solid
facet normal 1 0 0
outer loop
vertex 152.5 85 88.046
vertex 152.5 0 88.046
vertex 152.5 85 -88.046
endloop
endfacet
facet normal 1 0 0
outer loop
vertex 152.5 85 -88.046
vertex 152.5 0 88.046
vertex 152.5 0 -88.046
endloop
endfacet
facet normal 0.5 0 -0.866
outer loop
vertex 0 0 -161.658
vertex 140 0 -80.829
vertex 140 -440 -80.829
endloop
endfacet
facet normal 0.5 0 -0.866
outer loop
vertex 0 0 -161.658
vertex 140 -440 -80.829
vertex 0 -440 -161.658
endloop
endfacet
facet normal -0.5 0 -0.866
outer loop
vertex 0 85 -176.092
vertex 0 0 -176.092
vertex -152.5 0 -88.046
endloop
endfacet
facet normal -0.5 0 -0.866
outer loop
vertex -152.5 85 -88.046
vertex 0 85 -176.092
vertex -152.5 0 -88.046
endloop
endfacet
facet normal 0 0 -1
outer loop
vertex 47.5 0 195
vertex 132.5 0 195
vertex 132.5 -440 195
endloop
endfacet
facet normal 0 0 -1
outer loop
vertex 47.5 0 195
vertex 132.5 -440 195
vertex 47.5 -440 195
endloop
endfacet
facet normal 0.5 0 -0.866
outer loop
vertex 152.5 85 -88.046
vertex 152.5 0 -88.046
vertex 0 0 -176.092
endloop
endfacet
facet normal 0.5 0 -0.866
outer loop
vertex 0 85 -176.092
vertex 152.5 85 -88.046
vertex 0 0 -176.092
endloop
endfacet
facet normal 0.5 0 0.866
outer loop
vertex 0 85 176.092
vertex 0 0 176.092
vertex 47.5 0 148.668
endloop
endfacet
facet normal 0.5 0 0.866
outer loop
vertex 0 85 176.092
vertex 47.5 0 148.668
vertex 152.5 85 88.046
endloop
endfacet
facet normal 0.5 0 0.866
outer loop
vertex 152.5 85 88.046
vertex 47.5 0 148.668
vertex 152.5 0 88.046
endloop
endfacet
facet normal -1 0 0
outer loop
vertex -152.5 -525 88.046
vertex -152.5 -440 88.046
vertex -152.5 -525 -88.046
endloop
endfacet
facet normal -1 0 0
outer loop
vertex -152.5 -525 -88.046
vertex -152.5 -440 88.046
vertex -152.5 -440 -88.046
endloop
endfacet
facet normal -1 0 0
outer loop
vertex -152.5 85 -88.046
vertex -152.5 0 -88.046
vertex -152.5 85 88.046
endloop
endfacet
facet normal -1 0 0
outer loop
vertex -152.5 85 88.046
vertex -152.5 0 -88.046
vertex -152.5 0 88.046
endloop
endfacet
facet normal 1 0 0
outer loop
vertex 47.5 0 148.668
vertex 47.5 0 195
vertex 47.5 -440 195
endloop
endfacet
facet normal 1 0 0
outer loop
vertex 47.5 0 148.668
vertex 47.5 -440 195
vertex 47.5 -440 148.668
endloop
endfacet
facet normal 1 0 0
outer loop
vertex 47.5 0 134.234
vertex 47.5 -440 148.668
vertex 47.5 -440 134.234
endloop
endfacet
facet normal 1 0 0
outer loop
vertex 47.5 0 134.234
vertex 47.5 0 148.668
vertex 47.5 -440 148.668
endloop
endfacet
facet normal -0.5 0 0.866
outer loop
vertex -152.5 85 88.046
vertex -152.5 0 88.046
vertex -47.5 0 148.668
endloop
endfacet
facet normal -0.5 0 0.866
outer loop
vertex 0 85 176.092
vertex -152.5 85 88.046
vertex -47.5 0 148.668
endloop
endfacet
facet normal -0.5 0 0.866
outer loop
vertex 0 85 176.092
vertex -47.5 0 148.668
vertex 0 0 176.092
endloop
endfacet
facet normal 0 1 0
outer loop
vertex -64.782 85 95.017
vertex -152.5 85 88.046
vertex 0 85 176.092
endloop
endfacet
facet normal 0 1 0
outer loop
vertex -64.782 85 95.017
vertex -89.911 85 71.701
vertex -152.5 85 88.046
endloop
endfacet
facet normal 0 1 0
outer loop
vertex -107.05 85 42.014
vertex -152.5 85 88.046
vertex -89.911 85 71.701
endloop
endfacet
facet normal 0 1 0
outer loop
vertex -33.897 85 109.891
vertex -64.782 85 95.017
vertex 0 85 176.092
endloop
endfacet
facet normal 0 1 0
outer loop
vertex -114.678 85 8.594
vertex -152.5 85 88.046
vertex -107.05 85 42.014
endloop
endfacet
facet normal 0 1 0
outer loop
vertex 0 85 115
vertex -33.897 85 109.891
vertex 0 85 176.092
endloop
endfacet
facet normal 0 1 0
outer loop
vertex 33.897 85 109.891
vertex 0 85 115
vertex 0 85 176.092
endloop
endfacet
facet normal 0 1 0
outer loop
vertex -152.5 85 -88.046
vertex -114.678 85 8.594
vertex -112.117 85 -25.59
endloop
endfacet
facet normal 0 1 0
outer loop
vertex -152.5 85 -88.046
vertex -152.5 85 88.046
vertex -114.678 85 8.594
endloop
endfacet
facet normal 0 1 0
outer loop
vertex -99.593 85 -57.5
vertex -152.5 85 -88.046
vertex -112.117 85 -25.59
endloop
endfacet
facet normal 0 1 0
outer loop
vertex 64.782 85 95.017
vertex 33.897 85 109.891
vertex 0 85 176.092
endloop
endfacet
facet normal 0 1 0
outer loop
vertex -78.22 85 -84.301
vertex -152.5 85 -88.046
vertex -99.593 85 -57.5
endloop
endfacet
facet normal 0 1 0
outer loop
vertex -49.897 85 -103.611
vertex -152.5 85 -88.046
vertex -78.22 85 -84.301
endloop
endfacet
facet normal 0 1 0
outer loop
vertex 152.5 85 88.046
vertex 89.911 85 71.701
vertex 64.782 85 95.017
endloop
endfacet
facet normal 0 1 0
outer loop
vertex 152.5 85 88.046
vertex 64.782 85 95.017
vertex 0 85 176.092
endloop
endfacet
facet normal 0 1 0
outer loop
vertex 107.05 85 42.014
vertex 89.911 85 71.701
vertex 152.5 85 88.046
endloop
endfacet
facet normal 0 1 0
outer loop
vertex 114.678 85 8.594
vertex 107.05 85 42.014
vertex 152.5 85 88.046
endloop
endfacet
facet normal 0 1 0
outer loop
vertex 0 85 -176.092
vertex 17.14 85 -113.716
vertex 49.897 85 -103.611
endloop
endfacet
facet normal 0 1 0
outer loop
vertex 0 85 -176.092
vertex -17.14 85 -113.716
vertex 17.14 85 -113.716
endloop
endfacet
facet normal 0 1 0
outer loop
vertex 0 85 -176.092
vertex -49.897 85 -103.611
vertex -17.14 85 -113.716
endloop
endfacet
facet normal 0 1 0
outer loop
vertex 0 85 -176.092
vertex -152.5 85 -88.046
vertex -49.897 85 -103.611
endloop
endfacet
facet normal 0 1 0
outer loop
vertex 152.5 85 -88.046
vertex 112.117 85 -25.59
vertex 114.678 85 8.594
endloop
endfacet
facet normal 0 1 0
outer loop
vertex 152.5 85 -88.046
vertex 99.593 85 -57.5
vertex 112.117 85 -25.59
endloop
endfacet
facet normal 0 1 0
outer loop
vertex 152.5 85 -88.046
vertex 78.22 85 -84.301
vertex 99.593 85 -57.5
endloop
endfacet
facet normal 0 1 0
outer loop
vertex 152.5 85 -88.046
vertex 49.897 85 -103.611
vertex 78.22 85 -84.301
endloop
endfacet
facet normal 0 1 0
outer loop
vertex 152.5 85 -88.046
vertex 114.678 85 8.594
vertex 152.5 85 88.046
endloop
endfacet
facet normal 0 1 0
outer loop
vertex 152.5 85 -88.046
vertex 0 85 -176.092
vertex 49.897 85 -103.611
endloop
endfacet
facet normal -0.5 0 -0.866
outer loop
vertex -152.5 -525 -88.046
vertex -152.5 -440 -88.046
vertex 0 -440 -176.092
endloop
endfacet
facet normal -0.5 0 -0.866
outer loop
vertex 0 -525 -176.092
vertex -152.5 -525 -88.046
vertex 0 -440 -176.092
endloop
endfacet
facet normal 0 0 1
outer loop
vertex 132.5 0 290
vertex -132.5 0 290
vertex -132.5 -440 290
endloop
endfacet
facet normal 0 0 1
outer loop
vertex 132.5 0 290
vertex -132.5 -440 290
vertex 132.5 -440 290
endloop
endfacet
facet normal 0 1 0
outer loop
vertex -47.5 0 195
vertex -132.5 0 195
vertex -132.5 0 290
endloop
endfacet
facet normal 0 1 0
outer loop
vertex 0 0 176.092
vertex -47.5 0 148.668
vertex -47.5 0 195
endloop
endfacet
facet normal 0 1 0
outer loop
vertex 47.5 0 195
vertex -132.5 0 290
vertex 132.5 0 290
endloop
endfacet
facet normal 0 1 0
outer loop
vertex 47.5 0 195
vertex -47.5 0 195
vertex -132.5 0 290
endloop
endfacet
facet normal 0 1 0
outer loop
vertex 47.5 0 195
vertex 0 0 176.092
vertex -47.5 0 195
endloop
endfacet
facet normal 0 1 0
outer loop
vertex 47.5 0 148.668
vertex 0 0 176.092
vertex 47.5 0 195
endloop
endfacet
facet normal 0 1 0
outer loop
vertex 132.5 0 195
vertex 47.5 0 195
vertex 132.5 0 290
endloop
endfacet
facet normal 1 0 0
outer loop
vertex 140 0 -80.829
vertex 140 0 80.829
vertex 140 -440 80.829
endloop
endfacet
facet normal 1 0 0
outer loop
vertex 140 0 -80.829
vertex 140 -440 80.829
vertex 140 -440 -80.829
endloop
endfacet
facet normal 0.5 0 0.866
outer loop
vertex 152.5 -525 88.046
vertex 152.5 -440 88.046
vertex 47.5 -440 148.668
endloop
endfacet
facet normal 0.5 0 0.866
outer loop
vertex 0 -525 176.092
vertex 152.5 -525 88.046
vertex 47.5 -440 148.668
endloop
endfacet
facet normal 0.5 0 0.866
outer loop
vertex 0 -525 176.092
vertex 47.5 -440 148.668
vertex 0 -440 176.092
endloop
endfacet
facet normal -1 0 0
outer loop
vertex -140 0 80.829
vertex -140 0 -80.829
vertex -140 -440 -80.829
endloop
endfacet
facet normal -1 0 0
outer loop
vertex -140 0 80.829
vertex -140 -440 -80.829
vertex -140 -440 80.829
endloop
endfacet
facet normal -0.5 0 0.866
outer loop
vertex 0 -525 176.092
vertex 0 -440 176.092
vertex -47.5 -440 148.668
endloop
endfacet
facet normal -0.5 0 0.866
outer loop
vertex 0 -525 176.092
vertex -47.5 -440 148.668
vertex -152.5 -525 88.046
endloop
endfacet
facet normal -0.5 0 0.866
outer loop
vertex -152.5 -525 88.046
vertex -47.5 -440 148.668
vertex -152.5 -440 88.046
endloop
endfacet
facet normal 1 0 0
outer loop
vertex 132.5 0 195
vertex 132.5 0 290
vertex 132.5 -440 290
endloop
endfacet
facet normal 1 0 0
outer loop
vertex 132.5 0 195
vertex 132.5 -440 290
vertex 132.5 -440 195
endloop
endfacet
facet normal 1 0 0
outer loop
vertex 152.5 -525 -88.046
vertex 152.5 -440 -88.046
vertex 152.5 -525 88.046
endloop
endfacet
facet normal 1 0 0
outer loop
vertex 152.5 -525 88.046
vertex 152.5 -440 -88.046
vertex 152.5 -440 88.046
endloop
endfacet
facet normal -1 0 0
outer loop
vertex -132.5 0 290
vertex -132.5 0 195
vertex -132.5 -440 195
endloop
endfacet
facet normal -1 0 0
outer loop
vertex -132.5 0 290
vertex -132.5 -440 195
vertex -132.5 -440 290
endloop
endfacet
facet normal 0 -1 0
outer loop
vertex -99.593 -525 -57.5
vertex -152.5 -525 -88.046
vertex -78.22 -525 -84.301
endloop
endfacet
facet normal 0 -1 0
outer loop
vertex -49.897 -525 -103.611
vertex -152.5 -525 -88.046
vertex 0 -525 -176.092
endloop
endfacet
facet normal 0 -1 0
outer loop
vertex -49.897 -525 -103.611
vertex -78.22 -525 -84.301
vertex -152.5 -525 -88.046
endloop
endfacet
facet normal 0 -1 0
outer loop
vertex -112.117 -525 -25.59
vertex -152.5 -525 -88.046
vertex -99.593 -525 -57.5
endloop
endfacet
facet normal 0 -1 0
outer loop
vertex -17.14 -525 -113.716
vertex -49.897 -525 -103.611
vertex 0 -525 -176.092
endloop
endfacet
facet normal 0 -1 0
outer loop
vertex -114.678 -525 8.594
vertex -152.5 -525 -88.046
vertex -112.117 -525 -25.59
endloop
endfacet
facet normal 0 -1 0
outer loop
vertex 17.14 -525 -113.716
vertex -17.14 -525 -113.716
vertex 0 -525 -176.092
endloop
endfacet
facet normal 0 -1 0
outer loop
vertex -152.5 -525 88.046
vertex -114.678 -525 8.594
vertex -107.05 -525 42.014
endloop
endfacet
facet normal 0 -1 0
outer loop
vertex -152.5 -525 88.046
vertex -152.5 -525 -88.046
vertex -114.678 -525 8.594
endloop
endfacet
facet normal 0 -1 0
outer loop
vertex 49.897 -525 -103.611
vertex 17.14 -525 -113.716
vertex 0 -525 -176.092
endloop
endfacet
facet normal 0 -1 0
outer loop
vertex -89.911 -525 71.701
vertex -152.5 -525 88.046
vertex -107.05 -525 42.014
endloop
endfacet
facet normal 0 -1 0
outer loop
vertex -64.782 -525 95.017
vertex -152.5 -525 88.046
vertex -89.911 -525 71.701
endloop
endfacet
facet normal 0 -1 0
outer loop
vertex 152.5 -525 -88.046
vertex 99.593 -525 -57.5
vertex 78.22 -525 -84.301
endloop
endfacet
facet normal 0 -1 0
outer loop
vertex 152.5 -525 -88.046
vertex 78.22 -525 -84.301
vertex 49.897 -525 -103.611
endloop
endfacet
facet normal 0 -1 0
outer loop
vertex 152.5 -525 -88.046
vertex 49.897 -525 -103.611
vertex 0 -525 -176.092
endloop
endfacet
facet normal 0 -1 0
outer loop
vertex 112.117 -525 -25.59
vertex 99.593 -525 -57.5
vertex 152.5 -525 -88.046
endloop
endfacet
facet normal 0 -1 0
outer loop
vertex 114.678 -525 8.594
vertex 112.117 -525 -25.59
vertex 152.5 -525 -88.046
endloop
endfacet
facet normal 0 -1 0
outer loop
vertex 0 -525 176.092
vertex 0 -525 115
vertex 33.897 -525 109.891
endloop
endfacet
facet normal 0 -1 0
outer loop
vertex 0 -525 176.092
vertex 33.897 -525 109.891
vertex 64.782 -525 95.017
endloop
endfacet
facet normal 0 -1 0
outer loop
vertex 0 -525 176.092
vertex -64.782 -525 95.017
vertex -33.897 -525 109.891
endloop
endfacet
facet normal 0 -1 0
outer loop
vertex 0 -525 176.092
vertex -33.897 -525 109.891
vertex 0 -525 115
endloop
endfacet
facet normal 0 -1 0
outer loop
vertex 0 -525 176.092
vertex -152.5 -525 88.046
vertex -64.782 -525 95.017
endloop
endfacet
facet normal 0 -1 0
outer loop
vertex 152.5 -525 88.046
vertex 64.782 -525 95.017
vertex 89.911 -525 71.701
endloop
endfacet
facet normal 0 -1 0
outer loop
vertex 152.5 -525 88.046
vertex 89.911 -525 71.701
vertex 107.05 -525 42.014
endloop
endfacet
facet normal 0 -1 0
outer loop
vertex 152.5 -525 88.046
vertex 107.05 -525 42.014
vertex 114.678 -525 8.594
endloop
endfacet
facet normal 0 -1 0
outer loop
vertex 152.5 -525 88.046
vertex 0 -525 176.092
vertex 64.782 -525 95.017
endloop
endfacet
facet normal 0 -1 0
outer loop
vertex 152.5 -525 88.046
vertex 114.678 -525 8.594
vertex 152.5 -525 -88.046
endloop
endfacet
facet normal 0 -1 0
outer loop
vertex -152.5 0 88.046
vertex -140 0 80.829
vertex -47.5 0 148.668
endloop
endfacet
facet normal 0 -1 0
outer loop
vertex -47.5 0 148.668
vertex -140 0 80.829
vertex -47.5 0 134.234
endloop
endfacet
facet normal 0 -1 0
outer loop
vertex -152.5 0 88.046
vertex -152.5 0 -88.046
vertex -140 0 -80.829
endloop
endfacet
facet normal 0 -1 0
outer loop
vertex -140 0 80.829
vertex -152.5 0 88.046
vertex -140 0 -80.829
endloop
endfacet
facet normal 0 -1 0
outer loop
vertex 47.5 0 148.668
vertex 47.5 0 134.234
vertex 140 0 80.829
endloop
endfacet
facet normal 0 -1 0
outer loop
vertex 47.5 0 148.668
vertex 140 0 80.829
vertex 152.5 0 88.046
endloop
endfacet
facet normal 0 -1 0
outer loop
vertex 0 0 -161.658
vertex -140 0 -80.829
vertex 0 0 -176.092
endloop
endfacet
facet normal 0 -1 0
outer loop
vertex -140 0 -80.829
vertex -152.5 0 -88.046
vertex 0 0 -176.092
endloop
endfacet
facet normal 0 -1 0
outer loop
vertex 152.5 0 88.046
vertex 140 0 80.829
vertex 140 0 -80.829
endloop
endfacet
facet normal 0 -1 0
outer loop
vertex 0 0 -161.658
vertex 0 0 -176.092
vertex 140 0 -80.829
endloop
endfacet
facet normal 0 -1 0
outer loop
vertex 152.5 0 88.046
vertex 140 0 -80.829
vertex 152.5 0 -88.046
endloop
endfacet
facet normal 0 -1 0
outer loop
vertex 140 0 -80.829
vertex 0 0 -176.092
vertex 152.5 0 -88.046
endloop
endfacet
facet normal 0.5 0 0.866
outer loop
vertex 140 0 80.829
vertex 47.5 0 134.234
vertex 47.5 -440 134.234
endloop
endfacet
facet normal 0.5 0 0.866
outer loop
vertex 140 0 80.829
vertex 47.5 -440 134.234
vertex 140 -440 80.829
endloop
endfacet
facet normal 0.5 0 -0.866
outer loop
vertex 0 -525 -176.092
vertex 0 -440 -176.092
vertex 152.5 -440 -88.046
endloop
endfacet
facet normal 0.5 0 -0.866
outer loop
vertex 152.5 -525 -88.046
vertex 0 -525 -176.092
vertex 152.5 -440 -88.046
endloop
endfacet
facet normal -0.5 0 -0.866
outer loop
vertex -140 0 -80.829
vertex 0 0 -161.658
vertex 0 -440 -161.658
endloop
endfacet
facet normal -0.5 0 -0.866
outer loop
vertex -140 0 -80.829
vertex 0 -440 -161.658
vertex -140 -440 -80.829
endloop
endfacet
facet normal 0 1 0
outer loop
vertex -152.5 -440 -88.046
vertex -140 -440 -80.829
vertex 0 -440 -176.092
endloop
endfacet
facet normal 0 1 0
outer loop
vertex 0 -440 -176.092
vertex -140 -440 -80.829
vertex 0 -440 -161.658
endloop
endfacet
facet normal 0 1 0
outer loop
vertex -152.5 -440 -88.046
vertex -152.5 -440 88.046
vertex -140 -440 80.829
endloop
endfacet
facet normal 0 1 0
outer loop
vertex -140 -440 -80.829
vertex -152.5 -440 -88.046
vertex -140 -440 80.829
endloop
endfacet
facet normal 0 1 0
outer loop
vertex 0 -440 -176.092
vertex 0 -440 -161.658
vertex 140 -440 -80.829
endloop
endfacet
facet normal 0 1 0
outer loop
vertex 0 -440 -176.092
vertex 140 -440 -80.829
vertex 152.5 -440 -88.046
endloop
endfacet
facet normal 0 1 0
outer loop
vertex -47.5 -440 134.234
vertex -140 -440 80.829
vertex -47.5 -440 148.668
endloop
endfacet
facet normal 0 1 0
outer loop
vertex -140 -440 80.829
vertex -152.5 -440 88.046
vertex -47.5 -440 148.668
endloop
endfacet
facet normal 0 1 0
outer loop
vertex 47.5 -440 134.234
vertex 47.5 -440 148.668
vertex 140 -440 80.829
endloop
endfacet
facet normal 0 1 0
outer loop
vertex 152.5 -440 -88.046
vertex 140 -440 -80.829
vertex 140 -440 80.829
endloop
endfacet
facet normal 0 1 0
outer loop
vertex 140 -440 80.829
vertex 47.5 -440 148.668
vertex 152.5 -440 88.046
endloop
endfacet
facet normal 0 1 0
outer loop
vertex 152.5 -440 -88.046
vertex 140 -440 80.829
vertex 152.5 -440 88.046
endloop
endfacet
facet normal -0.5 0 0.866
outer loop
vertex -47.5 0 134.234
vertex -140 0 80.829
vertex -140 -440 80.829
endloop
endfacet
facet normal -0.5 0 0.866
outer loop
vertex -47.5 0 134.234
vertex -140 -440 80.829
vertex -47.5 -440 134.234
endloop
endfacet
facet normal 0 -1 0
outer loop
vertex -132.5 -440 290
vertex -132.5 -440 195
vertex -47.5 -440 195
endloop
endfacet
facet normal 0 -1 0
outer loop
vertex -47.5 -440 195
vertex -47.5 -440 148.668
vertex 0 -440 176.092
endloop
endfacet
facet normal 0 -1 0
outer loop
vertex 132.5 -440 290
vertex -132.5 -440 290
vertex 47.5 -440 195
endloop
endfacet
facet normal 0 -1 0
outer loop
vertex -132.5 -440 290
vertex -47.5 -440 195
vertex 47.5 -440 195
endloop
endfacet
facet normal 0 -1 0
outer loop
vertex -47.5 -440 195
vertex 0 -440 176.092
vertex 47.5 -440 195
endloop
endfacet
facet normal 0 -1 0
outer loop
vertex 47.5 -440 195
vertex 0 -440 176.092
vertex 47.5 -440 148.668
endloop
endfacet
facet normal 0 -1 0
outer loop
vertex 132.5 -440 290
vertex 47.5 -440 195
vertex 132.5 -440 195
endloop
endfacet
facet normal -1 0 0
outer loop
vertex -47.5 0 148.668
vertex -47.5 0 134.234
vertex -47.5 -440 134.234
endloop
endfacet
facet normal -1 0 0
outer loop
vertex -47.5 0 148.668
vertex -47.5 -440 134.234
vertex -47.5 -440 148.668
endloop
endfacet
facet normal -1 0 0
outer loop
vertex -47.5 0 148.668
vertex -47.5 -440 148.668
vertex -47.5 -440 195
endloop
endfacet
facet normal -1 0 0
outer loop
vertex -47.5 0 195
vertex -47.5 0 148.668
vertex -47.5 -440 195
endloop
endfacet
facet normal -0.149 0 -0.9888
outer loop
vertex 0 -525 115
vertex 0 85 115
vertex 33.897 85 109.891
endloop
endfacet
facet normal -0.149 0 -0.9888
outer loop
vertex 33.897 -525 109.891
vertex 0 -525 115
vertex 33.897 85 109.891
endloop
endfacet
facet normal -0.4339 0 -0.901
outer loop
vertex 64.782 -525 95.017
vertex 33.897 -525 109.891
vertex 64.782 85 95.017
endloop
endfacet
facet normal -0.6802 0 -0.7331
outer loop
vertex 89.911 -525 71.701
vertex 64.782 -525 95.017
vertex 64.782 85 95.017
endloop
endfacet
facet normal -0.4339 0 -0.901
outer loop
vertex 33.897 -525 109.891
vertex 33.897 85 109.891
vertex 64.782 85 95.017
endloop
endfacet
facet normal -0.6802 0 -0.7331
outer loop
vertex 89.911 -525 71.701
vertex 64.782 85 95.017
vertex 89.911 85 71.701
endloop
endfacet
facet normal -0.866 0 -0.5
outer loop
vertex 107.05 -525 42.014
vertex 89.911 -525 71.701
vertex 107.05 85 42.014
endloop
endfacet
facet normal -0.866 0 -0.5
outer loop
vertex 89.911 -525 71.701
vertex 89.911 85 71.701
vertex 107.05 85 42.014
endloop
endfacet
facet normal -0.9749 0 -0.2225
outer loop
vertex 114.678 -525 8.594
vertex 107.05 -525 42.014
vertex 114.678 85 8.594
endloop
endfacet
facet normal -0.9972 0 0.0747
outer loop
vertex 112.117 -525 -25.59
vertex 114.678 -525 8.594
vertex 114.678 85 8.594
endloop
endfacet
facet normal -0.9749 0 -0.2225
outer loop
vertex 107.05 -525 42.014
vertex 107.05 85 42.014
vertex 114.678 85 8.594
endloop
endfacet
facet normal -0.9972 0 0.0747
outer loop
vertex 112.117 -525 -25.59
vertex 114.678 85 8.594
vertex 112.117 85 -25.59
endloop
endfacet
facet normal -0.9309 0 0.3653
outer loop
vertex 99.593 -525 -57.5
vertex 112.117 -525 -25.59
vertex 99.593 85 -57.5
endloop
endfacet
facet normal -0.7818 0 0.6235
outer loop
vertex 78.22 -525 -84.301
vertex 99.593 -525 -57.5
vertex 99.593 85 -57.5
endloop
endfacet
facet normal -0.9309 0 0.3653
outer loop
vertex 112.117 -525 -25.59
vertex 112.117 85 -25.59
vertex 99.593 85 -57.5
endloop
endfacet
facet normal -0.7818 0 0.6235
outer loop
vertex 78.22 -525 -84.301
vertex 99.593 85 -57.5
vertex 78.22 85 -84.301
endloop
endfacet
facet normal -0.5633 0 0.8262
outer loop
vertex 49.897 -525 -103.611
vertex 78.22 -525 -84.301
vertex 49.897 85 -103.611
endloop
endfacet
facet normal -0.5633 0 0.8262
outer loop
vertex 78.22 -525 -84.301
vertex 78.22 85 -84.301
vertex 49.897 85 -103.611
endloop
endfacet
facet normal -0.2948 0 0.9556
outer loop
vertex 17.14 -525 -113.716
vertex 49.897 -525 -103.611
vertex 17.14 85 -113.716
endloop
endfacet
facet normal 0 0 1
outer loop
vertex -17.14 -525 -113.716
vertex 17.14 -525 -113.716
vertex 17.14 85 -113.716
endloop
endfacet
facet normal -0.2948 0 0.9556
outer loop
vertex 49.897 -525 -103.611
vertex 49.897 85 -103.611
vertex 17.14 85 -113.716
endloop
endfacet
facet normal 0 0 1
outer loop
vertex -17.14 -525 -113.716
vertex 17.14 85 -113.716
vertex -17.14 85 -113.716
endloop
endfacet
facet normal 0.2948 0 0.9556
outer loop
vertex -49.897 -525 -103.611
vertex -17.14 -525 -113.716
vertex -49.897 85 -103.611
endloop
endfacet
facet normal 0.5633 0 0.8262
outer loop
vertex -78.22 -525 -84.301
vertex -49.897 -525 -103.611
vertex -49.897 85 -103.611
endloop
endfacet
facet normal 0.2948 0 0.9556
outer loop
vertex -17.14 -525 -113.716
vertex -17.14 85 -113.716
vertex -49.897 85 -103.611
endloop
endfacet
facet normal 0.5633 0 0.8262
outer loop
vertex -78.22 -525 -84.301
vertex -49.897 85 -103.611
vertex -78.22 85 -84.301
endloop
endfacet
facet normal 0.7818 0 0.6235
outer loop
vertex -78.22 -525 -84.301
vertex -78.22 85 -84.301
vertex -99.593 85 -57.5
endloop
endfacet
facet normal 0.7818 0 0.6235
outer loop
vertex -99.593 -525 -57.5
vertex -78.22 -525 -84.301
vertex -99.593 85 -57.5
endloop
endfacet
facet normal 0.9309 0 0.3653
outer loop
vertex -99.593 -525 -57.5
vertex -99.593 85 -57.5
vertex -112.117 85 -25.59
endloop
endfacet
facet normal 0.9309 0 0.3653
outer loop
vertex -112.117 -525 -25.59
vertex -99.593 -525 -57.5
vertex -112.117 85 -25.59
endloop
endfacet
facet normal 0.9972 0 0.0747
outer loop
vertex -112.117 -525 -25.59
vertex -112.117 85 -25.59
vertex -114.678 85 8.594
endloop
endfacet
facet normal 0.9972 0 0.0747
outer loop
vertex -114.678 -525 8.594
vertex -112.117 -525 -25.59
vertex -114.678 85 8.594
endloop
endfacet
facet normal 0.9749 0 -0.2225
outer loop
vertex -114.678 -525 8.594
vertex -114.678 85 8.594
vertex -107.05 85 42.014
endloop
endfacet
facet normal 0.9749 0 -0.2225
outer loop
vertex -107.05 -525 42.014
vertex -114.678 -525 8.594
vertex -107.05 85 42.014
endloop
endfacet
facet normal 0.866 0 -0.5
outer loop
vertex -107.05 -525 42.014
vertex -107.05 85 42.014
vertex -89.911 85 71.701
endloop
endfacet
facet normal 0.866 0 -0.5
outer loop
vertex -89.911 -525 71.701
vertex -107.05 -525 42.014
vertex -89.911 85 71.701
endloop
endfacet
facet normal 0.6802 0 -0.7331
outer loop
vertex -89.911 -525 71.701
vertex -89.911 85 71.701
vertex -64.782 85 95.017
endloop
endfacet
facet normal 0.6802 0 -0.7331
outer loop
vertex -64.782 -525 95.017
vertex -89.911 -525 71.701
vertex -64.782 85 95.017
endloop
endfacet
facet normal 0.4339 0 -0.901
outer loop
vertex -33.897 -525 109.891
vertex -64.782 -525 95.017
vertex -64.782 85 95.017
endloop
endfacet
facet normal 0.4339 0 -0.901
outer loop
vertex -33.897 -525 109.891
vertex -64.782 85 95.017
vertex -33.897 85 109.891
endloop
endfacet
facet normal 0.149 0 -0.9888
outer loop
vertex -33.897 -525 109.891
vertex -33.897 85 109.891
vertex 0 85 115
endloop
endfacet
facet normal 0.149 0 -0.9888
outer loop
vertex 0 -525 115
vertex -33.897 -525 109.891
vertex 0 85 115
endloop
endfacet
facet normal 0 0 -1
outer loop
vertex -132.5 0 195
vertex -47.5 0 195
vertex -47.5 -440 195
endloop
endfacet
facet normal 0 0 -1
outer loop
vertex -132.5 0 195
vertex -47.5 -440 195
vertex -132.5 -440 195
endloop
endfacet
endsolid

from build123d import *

# Parameters (mm, degrees)
EXTRUDE_1_DEPTH     = 85
EXTRUDE_650_DEPTH   = 440
EXTRUDE_2_DEPTH     = 85
SKETCH_5_R          = 115
CUT_EXTRUDE_1_DEPTH = 693.42779407


with BuildPart() as part:
    # Эскиз2 → Боковой многогранник 1 (new body)
    with BuildSketch(Plane(origin=(0, 0, 0), x_dir=(1, 0, 0), z_dir=(0, 1, 0))):
        Polygon((0, 176.091832103), (-152.5, 88.045916051), (-152.5, -88.045916051), (0, -176.091832103), (152.5, -88.045916051), (152.5, 88.045916051), align=None)
    extrude(amount=EXTRUDE_1_DEPTH)

    # Sketch 292 → Extrude 650 (add)
    with BuildSketch(Plane(origin=(0, 0, 0), x_dir=(1, 0, 0), z_dir=(0, 1, 0))):
        Polygon((0, 161.658075373), (-140, 80.829037687), (-140, -80.829037687), (-47.5, -134.233937587), (-47.5, -195), (-132.5, -195), (-132.5, -290), (132.5, -290), (132.5, -195), (47.5, -195), (47.5, -134.233937587), (140, -80.829037687), (140, 80.829037687), align=None)
    extrude(amount=-EXTRUDE_650_DEPTH)

    # Эскиз4 → Боковой многогранник 2 (add)
    with BuildSketch(Plane.XZ.offset(440)):
        Polygon((0, -176.091832103), (152.5, -88.045916051), (152.5, 88.045916051), (0, 176.091832103), (-152.5, 88.045916051), (-152.5, -88.045916051), align=None)
    extrude(amount=EXTRUDE_2_DEPTH)

    # Эскиз5 → Вырез-Вытянуть1 (cut, through all)
    with BuildSketch(Plane(origin=(0, 85, 0), x_dir=(1, 0, 0), z_dir=(0, 1, 0))):
        with Locations(Location((0, 0, 0), (0, 0, 270))):
            Circle(SKETCH_5_R)
    extrude(amount=-CUT_EXTRUDE_1_DEPTH, mode=Mode.SUBTRACT)


solid = part.part
